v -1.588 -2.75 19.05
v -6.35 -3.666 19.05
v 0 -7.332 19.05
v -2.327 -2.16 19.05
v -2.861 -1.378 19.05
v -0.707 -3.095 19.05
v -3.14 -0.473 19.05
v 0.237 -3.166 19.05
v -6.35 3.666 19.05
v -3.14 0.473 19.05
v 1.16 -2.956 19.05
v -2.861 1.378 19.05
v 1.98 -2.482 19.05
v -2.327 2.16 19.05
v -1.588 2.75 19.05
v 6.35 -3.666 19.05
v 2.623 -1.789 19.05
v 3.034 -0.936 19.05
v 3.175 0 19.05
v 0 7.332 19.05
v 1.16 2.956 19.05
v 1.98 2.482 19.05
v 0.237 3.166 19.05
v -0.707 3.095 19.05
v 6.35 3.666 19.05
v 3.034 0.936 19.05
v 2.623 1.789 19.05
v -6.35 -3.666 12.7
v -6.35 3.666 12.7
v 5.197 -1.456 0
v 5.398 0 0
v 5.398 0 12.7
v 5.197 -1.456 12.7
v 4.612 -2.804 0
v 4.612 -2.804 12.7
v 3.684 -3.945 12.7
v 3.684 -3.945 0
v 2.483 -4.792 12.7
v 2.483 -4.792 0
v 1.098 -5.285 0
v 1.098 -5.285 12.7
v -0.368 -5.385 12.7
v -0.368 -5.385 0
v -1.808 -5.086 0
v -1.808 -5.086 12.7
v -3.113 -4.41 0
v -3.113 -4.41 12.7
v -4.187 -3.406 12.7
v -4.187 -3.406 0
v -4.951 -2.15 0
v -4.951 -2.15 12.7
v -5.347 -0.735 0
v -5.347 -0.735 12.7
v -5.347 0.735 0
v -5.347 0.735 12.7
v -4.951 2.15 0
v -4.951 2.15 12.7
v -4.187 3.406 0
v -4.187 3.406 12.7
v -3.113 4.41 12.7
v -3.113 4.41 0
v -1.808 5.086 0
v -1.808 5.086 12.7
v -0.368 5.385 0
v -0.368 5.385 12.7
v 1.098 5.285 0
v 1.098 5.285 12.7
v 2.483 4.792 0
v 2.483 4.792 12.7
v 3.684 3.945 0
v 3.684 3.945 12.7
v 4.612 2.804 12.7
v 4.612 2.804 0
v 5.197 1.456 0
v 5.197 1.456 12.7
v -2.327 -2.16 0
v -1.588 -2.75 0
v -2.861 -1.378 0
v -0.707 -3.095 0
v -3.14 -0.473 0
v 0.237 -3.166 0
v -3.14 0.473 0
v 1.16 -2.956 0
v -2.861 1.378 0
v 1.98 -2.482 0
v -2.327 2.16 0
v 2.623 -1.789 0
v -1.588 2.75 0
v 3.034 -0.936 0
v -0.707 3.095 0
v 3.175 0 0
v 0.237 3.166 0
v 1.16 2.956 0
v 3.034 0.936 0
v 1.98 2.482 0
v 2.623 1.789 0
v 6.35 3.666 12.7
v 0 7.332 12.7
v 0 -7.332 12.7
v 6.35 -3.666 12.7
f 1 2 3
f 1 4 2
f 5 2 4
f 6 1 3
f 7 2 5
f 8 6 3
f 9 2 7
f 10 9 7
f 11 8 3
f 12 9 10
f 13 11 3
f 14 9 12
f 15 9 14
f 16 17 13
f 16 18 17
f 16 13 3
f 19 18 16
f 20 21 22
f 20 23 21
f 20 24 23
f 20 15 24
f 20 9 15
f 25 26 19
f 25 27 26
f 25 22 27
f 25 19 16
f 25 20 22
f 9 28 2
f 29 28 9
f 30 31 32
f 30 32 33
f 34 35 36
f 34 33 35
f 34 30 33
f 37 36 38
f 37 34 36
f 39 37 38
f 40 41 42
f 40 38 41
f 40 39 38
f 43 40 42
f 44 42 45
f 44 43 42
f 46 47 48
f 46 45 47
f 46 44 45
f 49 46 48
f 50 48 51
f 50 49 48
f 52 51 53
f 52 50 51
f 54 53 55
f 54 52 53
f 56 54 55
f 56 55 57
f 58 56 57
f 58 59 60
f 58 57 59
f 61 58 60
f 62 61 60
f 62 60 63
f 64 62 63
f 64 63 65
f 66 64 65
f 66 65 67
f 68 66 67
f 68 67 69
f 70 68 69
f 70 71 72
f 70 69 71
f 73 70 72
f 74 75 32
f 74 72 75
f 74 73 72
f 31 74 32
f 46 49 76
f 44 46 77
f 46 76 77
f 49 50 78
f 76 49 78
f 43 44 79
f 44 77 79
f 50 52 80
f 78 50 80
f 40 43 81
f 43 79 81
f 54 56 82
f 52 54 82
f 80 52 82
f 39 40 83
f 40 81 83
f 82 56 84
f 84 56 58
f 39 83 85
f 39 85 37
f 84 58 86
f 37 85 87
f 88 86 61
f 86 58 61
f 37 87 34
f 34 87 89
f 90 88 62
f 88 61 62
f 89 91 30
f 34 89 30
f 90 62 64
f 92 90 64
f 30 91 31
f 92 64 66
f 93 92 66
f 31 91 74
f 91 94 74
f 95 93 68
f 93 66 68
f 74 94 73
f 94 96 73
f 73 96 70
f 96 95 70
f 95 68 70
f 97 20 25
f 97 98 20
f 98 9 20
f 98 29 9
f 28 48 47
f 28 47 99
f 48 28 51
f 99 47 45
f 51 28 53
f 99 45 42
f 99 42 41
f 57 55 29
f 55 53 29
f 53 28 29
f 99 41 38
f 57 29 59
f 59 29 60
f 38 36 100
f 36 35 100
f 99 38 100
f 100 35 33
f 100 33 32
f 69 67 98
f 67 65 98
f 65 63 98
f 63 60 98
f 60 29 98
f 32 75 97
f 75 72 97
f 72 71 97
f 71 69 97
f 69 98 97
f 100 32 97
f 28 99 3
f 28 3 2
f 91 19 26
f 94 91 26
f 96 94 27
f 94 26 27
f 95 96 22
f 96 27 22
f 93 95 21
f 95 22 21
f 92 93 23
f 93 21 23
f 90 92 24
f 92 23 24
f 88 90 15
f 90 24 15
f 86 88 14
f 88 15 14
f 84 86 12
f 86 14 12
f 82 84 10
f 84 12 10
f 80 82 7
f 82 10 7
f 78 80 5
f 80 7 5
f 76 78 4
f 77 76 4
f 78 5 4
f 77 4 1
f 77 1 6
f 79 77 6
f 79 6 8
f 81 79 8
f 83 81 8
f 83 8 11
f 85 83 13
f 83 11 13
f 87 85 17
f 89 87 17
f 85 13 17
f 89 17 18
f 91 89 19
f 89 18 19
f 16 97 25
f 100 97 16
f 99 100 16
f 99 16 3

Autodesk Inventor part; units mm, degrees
ref_plane "YZ Plane" through (0, 0, 0) normal (1, 0, 0) x (0, 1, 0)
ref_plane "XZ Plane" through (0, 0, 0) normal (0, 1, 0) x (-1, 0, 0)
ref_plane "XY Plane" through (0, 0, 0) normal (0, 0, 1) x (1, 0, 0)
sketch "Sketch1" plane through (0, 0, 0) normal (0, 0, 1) x (1, 0, 0)
  circle A0 centre (0, 0) radius 5.3975
  dimension "d0" = 10.795
extrude "Extrusion1" add sketch "Sketch1" along normal blind 12.7
thread "Thread1" size "7/16-14 UNC" class "2A" standard "ANSI Unified Screw Threads" full length
sketch "Sketch2" plane through (0, 0, 12.7) normal (0, 0, 1) x (1, 0, 0)
  circle A0 centre (0, 0) radius 5.3975 projected
  line L0 (0, 7.3323) -> (6.35, 3.6662)
  line L1 (6.35, 3.6662) -> (6.35, -3.6662)
  line L2 (6.35, -3.6662) -> (0, -7.3323)
  line L3 (0, -7.3323) -> (-6.35, -3.6662)
  line L4 (-6.35, -3.6662) -> (-6.35, 3.6662)
  line L5 (-6.35, 3.6662) -> (0, 7.3323)
  dimension "d5" = 12.7
  dimension "d6" = 0
extrude "Extrusion2" add sketch "Sketch2" along normal blind 6.35 contours A0 | L0 L1 L2 L3 L4 L5
sketch "Sketch5" plane through (0, 0, 19.05) normal (0, 0, 1) x (1, 0, 0)
  circle A0 centre (0, 0) radius 3.175
  dimension "d14" = 6.35
extrude "Extrusion5" cut sketch "Sketch5" against normal through all
properties part number "Pnematic Screw Part 1764"
